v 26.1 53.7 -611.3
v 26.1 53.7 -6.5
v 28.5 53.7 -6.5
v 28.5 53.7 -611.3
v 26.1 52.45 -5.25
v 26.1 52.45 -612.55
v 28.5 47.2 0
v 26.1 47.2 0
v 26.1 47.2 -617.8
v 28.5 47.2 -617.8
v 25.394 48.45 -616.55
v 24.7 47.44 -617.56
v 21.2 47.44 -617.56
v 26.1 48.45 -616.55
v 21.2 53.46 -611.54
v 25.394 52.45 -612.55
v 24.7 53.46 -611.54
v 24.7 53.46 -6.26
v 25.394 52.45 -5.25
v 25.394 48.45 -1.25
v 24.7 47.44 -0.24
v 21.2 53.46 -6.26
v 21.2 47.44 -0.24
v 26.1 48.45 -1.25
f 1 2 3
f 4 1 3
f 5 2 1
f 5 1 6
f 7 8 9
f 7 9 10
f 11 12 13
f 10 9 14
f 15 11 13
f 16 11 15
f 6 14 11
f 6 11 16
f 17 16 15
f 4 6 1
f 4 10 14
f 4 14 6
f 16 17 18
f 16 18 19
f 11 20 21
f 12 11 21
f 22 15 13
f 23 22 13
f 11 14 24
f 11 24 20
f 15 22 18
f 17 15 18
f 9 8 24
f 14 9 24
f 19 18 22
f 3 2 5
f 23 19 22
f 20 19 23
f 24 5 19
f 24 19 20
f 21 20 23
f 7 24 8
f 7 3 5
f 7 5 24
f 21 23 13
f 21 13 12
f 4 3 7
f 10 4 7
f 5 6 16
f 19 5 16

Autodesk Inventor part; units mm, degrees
ref_plane "YZ Plane" through (0, 0, 0) normal (1, 0, 0) x (0, 1, 0)
ref_plane "XZ Plane" through (0, 0, 0) normal (0, 1, 0) x (-1, 0, 0)
sketch "Boceto1" plane through (0, 0, 0) normal (0, 0, 1) x (1, 0, 0)
  line L0 (28.5, 53.7) -> (28.5, 47.2)
  line L1 (26.1, 47.2) -> (28.5, 47.2)
  line L2 (26.1, 48.45) -> (25.3942, 48.45)
  line L3 (25.3942, 48.45) -> (24.7, 47.44)
  line L4 (26.1, 52.45) -> (25.3942, 52.45)
  line L5 (26.1, 53.7) -> (28.5, 53.7)
  line L6 (24.7, 53.46) -> (25.3942, 52.45)
  line L7 (26.1, 53.7) -> (26.1, 52.45)
  line L8 (26.1, 47.2) -> (26.1, 48.45)
  line L9 (21.2, 47.44) -> (24.7, 47.44)
  line L10 (21.2, 53.46) -> (21.2, 47.44)
  line L11 (21.2, 53.46) -> (24.7, 53.46)
  point P0 (28.5, 50.45)
  dimension "d78" = 6.5
  dimension "d88" = 2.4
  dimension "d95" = 6.02
  dimension "d100" = 2.4
  dimension "d108" = 4
  dimension "d109" = 0.7058
  dimension "d110" = 0.7058
  dimension "d145" = 2
  dimension "d146" = 2
  dimension "d150" = 3.5
  dimension "d151" = 3.5
extrude "Extrusión1" add sketch "Boceto1" against normal blind 617.8
ref_plane "Plano de trabajo1" through (0, 0, -308.9) normal (0, 0, 1) x (1, 0, 0)
sketch "Boceto2" plane through (28.5, -22.9, 0) normal (-1, 0, 0) x (0, 0, 1)
  line L0 (-617.8, 76.6) -> (-617.8, 70.1) projected
  line L1 (-617.8, 70.1) -> (-617.8, 76.6)
  line L2 (-617.8, 76.6) -> (-611.3, 76.6)
  line L3 (0, 76.6) -> (-617.8, 76.6) projected
  line L4 (-617.8, 70.1) -> (-611.3, 76.6)
  dimension "d149" = 45
extrude "Extrusión2" cut sketch "Boceto2" along normal through all
mirror "Simetría1" about plane through (0, 0, -308.9) normal (0, 0, 1) of "Extrusión2"
properties part number "SP40-02 JUNTA INT 207" material "Caucho, negro"
